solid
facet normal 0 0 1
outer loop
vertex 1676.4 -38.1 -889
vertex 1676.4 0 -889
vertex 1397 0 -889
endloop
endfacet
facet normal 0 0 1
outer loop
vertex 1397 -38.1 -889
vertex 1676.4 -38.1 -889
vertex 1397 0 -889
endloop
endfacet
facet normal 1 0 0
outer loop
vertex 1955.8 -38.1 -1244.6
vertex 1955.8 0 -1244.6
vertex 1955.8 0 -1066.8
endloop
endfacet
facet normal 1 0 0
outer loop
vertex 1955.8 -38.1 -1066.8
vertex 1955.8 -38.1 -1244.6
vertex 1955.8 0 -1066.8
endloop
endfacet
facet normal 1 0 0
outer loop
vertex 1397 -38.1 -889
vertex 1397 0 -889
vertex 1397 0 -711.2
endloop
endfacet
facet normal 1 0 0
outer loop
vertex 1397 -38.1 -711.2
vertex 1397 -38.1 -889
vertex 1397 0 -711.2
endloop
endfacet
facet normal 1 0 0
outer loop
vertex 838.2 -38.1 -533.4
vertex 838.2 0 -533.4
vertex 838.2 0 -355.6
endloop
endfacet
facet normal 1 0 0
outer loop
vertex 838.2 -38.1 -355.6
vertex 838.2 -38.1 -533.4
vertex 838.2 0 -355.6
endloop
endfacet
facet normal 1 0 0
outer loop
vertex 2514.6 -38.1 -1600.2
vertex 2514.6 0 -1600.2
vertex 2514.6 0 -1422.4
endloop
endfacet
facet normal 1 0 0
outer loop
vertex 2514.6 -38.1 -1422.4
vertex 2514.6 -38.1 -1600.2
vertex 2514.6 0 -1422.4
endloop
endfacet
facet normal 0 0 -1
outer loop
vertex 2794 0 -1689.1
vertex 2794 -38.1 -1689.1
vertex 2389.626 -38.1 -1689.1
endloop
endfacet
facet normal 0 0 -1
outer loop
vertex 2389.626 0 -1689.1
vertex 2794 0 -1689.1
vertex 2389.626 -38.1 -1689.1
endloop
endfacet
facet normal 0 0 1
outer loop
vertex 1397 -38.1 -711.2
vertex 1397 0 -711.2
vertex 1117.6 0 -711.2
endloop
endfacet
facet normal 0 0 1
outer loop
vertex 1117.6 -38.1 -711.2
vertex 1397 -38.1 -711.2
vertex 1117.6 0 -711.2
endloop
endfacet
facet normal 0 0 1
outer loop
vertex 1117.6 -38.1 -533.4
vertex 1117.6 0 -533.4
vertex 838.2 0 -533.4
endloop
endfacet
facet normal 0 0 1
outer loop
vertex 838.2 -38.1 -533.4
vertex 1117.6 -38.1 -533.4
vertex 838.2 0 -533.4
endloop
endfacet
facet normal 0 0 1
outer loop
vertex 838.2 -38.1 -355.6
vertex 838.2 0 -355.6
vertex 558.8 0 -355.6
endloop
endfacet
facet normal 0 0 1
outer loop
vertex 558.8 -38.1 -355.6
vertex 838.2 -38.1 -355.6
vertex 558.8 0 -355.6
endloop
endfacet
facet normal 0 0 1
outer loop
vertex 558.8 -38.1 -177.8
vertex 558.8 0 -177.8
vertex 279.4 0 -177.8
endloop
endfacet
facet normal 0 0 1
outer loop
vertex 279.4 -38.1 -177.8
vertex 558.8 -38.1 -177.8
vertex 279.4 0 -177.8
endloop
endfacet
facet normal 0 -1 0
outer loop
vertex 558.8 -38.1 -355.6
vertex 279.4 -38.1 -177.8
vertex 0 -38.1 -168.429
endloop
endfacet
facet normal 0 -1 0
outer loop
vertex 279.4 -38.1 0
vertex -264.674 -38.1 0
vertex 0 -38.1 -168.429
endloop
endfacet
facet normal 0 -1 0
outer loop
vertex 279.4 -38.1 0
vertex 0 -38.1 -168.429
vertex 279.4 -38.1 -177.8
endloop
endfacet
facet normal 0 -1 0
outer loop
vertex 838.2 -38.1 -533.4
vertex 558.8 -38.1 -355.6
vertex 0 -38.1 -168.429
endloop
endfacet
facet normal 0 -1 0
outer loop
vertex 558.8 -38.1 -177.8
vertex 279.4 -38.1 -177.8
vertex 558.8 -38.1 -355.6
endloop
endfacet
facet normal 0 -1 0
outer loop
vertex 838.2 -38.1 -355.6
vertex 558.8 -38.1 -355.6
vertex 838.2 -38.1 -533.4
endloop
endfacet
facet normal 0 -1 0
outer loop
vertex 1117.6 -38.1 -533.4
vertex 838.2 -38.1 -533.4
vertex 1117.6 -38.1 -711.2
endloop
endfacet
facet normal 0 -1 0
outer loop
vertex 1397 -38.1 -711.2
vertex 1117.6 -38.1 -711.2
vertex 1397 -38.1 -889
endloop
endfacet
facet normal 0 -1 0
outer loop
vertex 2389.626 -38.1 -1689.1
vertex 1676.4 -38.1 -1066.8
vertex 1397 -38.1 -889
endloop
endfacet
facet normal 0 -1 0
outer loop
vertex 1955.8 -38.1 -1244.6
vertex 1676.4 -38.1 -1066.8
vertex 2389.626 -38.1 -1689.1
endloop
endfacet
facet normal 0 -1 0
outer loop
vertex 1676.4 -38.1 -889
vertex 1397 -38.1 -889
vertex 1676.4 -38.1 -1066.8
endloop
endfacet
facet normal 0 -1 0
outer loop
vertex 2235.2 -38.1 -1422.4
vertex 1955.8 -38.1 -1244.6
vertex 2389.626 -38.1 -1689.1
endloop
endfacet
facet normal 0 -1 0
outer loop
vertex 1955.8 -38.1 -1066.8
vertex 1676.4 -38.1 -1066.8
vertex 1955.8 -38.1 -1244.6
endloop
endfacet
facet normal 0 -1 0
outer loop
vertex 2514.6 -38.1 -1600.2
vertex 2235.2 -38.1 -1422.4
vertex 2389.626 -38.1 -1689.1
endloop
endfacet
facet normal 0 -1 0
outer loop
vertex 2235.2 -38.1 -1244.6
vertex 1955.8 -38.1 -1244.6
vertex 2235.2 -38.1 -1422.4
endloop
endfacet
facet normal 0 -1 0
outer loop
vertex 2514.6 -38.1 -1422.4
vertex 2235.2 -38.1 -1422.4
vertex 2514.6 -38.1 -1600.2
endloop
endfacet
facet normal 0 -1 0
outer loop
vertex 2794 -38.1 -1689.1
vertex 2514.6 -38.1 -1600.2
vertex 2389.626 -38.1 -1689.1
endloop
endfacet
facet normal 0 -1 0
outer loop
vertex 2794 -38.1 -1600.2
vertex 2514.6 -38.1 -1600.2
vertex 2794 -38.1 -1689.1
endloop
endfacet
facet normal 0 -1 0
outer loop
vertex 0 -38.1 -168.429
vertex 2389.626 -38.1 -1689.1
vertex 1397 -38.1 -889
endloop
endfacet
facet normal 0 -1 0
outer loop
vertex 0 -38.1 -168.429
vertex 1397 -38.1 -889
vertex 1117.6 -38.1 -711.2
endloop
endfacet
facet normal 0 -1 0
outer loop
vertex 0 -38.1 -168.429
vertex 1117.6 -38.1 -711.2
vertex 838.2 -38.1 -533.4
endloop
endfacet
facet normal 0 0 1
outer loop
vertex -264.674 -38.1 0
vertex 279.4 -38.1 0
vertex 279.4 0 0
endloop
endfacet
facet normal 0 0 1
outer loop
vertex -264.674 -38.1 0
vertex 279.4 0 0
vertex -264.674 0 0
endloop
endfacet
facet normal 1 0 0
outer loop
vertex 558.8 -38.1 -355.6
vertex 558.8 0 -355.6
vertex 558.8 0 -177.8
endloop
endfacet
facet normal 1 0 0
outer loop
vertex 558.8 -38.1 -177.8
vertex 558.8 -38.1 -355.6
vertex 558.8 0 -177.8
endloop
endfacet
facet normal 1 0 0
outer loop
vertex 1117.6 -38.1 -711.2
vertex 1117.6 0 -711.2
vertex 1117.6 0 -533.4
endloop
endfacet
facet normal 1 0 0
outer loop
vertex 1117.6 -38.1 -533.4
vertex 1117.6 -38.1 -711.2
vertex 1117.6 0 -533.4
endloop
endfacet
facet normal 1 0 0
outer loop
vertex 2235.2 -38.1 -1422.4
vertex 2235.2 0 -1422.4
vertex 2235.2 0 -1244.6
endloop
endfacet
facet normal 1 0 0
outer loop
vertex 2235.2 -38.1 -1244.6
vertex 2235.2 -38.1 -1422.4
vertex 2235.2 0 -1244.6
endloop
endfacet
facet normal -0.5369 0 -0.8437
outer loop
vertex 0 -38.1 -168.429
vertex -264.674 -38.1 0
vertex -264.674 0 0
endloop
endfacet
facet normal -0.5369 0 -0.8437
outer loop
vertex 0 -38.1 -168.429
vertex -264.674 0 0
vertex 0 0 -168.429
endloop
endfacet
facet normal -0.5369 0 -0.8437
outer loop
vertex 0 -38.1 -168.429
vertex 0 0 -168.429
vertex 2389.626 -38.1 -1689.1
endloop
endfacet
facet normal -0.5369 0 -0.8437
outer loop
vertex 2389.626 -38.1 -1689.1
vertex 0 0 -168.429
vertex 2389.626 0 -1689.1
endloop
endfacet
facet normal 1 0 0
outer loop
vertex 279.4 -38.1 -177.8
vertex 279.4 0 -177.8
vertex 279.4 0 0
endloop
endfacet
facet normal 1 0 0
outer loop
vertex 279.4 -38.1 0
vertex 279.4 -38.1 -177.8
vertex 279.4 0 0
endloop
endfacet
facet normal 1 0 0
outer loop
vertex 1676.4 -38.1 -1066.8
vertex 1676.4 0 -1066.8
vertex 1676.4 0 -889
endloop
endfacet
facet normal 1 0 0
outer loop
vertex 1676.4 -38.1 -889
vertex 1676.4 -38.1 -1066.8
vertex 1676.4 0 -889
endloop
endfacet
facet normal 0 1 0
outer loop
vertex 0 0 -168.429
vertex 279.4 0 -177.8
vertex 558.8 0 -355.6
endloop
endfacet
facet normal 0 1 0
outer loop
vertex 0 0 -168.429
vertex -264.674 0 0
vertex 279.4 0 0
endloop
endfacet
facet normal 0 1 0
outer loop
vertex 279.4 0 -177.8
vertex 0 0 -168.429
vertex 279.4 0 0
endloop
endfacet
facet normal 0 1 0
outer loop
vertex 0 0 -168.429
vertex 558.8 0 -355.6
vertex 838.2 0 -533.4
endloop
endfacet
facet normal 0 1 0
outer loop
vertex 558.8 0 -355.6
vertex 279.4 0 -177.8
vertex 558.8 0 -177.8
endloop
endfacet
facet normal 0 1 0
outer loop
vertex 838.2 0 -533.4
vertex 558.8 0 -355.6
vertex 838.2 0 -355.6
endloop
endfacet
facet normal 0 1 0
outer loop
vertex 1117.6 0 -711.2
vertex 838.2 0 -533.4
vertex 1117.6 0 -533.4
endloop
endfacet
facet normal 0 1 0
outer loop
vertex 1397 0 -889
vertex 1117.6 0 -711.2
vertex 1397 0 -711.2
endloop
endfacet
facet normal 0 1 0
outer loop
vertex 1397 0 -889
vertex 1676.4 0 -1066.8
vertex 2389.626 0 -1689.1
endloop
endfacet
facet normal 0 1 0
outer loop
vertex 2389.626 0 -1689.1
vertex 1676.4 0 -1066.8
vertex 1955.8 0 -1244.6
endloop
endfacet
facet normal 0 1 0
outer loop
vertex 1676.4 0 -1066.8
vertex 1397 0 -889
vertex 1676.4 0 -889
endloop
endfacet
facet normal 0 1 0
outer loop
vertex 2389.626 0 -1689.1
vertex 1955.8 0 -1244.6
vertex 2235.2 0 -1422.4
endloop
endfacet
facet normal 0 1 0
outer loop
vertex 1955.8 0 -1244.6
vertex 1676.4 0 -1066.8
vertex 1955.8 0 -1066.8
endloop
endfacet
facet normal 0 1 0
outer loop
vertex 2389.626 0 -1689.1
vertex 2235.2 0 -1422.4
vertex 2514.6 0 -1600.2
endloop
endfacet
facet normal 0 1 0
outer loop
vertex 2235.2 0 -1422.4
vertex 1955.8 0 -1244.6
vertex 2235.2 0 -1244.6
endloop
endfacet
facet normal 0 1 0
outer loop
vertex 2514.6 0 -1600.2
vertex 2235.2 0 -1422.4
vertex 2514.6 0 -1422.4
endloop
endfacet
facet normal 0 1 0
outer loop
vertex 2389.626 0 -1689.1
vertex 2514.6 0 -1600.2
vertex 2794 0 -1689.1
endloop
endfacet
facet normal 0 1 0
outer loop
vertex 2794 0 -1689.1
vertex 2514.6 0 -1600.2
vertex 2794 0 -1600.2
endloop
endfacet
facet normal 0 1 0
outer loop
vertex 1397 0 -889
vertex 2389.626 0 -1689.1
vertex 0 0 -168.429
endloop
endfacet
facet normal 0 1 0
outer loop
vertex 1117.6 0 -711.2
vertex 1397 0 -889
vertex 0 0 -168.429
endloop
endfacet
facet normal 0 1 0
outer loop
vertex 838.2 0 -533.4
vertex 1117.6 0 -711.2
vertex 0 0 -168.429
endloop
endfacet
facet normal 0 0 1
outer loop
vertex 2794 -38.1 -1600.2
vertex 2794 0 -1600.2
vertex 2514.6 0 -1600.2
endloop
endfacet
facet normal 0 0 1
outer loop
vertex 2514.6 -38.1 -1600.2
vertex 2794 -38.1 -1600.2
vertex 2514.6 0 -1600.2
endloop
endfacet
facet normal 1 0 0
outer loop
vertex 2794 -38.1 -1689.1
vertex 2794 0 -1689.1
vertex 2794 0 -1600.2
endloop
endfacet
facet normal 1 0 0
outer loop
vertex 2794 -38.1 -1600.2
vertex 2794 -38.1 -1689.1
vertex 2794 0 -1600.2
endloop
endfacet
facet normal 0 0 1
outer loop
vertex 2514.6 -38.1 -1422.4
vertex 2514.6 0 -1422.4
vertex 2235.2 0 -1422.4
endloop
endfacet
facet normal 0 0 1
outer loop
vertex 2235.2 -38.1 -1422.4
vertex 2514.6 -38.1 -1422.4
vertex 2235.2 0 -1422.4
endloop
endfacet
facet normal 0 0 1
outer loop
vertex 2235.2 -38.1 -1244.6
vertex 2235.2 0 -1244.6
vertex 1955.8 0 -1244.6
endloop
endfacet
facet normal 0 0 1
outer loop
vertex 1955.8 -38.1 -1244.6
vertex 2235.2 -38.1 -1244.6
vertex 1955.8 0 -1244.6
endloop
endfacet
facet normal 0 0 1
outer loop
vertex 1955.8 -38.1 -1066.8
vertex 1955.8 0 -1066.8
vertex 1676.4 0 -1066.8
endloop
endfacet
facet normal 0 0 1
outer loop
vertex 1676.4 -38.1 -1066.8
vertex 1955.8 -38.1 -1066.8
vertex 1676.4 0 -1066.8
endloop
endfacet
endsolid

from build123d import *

# Parameters (mm, degrees)
F1_DEPTH = 38.1
F3_DEPTH = 38.1
F5_DEPTH = 38.101


with BuildPart() as f1:
    # F0 (on Front) → F1 (new body)
    with BuildSketch(Plane.XZ):
        Polygon((279.4, 0), (0, 0), (0, -168.428913), (2529.325994, -1778), (2794, -1778), (2794, -1600.2), (2514.6, -1600.2), (2514.6, -1422.4), (2235.2, -1422.4), (2235.2, -1244.6), (1955.8, -1244.6), (1955.8, -1066.8), (1676.4, -1066.8), (1676.4, -889), (1397, -889), (1397, -711.2), (1117.6, -711.2), (1117.6, -533.4), (838.2, -533.4), (838.2, -355.6), (558.8, -355.6), (558.8, -177.8), (279.4, -177.8), align=None)
    extrude(amount=F1_DEPTH)

    # F2 (on face) → F3 (join)
    with BuildSketch(Plane.XZ.offset(38.1)):
        Polygon((0, -168.428913), (0, 0), (-264.674006, 0), align=None)
    extrude(amount=-F3_DEPTH)

    # F4 (on face) → F5 (cut, through all)
    with BuildSketch(Plane.XZ.offset(38.1)):
        Polygon((2794, -1778), (2794, -1689.1), (2389.625994, -1689.1), (2529.325994, -1778), align=None)
    extrude(amount=-F5_DEPTH, mode=Mode.SUBTRACT)


solid = f1.part
